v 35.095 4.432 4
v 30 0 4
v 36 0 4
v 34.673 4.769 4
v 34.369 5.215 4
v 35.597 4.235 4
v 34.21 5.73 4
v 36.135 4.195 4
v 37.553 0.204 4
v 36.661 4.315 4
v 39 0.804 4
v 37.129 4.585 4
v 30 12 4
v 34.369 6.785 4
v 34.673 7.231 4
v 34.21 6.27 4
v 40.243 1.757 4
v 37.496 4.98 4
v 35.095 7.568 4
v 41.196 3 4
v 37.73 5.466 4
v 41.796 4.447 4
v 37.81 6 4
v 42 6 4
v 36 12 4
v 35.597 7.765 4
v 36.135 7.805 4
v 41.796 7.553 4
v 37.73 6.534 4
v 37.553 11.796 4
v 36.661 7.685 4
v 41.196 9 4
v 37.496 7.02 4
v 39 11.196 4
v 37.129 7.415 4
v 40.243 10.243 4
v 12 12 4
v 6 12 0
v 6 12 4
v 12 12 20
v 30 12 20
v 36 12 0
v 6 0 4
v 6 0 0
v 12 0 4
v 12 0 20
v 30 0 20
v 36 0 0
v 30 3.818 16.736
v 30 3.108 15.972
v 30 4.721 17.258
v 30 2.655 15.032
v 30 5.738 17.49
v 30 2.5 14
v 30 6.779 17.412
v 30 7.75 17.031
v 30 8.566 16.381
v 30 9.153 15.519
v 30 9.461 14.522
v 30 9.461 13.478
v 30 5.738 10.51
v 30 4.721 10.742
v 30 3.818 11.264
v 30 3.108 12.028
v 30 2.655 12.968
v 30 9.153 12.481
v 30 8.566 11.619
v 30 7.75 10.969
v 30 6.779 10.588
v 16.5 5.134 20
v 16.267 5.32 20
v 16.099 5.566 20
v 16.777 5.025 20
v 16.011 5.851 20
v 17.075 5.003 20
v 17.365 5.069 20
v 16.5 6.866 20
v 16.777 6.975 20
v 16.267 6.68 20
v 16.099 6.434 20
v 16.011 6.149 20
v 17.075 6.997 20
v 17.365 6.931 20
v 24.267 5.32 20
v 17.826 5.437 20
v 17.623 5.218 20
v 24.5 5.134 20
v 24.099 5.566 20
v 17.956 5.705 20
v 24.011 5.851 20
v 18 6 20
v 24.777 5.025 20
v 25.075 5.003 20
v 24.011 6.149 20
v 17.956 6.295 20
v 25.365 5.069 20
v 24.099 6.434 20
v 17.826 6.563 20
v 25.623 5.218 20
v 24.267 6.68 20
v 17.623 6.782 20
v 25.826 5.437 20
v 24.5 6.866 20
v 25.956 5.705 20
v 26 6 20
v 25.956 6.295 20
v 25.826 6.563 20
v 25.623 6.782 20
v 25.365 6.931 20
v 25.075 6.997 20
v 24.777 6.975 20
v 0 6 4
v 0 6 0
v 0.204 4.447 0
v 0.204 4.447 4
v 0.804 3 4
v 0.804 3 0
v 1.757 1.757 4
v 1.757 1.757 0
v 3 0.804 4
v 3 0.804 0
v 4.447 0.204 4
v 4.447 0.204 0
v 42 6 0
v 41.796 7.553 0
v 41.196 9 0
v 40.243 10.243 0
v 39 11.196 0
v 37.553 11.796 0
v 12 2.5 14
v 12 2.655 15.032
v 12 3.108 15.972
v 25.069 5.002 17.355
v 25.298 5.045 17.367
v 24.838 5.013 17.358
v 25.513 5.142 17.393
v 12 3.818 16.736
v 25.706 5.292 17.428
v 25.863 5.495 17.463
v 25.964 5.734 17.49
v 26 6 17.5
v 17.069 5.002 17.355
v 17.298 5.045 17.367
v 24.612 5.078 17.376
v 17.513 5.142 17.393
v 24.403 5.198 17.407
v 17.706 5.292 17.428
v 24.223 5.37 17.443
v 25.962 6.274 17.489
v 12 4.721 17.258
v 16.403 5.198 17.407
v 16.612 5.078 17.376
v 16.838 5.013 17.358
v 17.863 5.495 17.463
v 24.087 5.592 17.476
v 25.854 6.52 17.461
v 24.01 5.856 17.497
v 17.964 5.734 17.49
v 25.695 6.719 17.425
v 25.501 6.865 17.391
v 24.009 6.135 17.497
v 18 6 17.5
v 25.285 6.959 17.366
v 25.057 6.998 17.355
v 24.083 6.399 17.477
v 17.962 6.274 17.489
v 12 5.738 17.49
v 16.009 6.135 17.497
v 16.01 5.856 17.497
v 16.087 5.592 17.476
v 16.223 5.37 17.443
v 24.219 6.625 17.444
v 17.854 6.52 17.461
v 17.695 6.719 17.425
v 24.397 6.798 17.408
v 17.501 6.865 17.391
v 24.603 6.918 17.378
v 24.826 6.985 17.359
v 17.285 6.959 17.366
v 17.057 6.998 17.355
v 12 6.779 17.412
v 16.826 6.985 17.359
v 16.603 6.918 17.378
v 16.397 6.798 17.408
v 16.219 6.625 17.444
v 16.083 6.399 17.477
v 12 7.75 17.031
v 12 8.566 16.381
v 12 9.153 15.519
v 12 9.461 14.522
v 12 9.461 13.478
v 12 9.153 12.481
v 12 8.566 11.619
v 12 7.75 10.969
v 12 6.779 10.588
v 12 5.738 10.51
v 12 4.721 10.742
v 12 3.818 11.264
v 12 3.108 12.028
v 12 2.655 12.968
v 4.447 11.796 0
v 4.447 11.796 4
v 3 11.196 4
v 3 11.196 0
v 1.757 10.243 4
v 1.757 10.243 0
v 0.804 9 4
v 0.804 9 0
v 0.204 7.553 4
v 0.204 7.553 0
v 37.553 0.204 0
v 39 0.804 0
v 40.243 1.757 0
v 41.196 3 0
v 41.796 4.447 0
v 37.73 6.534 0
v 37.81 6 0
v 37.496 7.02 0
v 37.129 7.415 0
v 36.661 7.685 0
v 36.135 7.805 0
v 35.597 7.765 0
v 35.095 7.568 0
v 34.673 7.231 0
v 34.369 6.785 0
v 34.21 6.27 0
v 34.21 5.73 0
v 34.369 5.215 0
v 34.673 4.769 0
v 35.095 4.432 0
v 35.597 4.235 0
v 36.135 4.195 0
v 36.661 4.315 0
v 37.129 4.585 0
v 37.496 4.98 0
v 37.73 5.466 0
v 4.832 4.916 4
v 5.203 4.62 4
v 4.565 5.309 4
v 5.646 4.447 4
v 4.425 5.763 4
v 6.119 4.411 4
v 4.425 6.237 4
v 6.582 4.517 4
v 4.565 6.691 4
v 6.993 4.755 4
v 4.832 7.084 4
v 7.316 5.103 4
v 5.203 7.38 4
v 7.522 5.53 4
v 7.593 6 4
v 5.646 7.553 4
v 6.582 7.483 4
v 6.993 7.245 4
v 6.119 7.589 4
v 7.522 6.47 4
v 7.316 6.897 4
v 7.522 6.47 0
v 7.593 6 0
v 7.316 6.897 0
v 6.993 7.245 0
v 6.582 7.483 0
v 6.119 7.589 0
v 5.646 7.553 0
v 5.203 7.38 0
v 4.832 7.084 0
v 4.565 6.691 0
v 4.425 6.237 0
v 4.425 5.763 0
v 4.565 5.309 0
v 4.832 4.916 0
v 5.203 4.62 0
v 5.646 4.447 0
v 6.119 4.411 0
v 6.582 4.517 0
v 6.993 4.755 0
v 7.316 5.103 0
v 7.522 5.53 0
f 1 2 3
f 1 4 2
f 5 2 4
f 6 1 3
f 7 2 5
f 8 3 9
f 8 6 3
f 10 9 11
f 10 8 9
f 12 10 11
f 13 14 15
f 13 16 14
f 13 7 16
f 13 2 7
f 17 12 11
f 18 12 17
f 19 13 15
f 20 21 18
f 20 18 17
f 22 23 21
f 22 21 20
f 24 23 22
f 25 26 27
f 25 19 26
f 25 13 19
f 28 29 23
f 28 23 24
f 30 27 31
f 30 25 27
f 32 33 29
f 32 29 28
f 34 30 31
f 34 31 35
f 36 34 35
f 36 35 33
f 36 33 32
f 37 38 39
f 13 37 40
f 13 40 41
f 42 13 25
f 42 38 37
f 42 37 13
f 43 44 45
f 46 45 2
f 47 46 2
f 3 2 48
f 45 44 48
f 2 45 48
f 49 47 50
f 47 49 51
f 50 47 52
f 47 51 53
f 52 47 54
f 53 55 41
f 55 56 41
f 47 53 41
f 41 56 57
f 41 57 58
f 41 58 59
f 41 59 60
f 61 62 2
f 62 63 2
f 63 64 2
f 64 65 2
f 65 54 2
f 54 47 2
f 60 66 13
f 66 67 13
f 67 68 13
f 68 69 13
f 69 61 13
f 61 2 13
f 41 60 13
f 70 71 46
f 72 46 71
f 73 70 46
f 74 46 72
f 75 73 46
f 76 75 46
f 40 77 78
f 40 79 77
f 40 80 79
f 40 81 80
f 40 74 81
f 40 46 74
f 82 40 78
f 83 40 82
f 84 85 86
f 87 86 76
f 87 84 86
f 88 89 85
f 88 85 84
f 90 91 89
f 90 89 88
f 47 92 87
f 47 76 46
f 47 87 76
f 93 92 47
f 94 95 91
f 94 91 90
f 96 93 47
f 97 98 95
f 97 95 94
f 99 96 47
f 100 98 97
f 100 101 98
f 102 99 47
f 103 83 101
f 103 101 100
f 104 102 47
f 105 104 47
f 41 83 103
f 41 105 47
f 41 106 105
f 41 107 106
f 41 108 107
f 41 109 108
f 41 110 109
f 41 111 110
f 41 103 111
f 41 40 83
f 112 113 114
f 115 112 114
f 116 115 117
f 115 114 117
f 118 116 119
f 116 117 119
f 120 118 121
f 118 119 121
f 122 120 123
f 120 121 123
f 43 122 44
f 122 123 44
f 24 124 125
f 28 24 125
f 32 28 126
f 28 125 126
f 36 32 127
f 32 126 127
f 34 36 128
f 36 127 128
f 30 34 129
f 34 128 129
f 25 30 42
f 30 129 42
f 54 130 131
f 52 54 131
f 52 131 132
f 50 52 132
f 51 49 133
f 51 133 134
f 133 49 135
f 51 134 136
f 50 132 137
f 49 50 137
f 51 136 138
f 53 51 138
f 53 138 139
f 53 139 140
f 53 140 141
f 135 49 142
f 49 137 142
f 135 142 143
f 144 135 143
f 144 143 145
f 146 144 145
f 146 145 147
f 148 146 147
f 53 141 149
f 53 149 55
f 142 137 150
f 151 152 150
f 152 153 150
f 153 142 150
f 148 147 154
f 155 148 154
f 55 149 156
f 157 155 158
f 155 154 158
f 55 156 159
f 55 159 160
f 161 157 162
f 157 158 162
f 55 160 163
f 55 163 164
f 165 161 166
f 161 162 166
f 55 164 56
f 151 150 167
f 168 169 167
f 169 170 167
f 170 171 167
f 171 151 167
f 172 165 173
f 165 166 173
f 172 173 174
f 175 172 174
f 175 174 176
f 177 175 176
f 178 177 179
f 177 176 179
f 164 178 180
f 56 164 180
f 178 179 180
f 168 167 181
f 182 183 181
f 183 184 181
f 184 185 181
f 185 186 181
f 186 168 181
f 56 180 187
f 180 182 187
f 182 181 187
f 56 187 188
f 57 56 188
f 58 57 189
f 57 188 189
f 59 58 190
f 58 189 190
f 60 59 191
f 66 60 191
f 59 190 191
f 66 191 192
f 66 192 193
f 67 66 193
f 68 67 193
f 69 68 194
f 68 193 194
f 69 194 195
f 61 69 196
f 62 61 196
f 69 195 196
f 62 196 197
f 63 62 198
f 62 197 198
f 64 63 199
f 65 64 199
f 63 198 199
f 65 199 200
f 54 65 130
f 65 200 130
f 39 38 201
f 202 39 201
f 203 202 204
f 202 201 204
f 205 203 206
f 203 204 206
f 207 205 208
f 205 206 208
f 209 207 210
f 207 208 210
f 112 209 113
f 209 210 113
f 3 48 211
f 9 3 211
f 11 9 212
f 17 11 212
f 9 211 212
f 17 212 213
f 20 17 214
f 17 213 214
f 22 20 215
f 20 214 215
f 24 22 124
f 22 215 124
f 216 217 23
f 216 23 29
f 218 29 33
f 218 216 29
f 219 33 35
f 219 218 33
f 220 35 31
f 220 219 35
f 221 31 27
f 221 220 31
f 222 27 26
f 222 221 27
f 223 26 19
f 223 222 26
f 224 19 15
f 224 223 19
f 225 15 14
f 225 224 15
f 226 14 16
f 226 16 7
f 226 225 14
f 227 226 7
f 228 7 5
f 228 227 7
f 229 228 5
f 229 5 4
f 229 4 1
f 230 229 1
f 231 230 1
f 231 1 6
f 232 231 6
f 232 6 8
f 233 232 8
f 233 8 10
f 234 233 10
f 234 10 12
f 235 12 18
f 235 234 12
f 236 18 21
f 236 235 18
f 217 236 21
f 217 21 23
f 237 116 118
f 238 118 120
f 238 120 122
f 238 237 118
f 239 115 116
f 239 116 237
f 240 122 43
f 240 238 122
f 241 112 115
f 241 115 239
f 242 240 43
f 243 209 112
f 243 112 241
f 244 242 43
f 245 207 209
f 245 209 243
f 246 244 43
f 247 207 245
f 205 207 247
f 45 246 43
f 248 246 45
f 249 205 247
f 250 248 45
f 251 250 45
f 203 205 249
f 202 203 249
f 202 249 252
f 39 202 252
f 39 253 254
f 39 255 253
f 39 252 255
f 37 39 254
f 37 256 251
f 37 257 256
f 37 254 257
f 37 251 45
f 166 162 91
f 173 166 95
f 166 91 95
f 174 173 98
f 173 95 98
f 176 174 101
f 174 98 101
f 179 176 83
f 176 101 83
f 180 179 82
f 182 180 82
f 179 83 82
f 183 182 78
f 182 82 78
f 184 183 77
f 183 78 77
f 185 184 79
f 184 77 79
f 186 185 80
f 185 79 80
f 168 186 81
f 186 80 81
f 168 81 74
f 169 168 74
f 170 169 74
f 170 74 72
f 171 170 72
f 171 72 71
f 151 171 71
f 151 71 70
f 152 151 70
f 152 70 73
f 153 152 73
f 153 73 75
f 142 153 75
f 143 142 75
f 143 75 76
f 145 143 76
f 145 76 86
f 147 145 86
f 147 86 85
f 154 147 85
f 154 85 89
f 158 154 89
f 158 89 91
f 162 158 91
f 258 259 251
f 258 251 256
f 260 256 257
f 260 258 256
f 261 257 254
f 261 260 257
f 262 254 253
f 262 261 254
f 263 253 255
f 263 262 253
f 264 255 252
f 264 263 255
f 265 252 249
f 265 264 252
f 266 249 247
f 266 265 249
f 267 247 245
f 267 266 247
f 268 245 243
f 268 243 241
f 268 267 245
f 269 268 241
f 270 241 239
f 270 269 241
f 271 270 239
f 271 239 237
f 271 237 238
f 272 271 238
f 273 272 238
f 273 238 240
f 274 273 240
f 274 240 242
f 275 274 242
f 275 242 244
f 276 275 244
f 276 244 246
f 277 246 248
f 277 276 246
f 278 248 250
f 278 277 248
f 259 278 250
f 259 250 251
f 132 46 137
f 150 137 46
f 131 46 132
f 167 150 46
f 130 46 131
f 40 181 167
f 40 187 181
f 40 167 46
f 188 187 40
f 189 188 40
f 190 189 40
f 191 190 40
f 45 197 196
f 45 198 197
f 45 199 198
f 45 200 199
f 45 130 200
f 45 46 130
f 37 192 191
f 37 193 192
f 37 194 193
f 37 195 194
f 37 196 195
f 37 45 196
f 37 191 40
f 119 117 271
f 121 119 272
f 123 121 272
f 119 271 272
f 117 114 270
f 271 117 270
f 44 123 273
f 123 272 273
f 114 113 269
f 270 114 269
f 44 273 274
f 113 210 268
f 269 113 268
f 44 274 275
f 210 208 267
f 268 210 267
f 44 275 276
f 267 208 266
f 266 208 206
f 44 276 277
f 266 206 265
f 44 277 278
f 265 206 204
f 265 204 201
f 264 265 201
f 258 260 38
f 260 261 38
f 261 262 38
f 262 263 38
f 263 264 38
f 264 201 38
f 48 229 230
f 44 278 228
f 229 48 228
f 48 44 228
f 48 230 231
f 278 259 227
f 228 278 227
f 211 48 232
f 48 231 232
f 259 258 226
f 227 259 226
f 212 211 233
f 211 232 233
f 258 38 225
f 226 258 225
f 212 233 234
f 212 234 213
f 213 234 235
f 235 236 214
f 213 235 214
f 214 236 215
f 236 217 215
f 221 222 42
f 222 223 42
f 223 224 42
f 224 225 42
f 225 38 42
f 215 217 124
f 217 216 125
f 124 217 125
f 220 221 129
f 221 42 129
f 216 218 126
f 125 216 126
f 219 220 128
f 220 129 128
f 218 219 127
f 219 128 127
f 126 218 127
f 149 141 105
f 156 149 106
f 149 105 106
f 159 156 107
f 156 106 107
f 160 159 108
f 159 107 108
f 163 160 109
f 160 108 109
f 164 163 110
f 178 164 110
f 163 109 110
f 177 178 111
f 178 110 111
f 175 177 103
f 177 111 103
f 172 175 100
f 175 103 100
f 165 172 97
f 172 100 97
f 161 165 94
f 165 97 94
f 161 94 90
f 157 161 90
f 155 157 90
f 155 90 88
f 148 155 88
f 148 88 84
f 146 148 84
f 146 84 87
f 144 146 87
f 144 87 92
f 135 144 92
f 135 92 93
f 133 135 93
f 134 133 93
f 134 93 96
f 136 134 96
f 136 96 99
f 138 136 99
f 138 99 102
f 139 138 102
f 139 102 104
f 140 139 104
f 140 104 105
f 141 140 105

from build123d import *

# Parameters (mm, degrees)
F0_R     = 1.5930303601
F1_DEPTH = 4
F0_R_2   = 1.8103813353
F0_W     = 18
F0_H     = 12
F2_DEPTH = 20
F3_R     = 3.5
F4_DEPTH = 25
F5_R     = 1
F6_DEPTH = 5


with BuildPart() as f1:
    # F0 (on Top) → F1 (new body)
    with BuildSketch(Plane.XY):
        with BuildLine():
            ThreePointArc((0, 6), (1.7573593129, 1.7573593129), (6, 0))
            Line((6, 0), (12, 0))
            Line((12, 0), (12, 12))
            Line((12, 12), (6, 12))
            ThreePointArc((6, 12), (1.7573593129, 10.2426406871), (0, 6))
        make_face()
        with Locations((6, 6)):
            Circle(F0_R, mode=Mode.SUBTRACT)
    extrude(amount=F1_DEPTH)



with BuildPart() as f1b:
    # F0 (on Top) → F1, piece 2 (new body)
    with BuildSketch(Plane.XY):
        with BuildLine():
            Line((30, 12), (30, 0))
            Line((30, 0), (36, 0))
            ThreePointArc((36, 0), (40.2426406871, 1.7573593129), (42, 6))
            ThreePointArc((42, 6), (40.2426406871, 10.2426406871), (36, 12))
            Line((36, 12), (30, 12))
        make_face()
        with Locations((36, 6)):
            Circle(F0_R_2, mode=Mode.SUBTRACT)
    extrude(amount=F1_DEPTH)


with BuildPart() as f1_1:
    add(f1.part)

    add(f1b.part)  # F2 merges F1b
    # F0 (on Top) → F2 (join)
    with BuildSketch(Plane.XY):
        with Locations((21, 6)):
            Rectangle(F0_W, F0_H)
    extrude(amount=F2_DEPTH)

    # F3 (on face) → F4 (cut)
    with BuildSketch(Plane(origin=(12, 0, 0), x_dir=(0, -1, 0), z_dir=(-1, 0, 0))):
        with Locations((-6, 14)):
            Circle(F3_R)
    extrude(amount=-F4_DEPTH, mode=Mode.SUBTRACT)

    # F5 (on face) → F6 (cut)
    with BuildSketch(Plane.XY.offset(20)):
        with Locations((17, 6)):
            Circle(F5_R)
        with Locations((25, 6)):
            Circle(F5_R)
    extrude(amount=-F6_DEPTH, mode=Mode.SUBTRACT)


solid = f1_1.part
